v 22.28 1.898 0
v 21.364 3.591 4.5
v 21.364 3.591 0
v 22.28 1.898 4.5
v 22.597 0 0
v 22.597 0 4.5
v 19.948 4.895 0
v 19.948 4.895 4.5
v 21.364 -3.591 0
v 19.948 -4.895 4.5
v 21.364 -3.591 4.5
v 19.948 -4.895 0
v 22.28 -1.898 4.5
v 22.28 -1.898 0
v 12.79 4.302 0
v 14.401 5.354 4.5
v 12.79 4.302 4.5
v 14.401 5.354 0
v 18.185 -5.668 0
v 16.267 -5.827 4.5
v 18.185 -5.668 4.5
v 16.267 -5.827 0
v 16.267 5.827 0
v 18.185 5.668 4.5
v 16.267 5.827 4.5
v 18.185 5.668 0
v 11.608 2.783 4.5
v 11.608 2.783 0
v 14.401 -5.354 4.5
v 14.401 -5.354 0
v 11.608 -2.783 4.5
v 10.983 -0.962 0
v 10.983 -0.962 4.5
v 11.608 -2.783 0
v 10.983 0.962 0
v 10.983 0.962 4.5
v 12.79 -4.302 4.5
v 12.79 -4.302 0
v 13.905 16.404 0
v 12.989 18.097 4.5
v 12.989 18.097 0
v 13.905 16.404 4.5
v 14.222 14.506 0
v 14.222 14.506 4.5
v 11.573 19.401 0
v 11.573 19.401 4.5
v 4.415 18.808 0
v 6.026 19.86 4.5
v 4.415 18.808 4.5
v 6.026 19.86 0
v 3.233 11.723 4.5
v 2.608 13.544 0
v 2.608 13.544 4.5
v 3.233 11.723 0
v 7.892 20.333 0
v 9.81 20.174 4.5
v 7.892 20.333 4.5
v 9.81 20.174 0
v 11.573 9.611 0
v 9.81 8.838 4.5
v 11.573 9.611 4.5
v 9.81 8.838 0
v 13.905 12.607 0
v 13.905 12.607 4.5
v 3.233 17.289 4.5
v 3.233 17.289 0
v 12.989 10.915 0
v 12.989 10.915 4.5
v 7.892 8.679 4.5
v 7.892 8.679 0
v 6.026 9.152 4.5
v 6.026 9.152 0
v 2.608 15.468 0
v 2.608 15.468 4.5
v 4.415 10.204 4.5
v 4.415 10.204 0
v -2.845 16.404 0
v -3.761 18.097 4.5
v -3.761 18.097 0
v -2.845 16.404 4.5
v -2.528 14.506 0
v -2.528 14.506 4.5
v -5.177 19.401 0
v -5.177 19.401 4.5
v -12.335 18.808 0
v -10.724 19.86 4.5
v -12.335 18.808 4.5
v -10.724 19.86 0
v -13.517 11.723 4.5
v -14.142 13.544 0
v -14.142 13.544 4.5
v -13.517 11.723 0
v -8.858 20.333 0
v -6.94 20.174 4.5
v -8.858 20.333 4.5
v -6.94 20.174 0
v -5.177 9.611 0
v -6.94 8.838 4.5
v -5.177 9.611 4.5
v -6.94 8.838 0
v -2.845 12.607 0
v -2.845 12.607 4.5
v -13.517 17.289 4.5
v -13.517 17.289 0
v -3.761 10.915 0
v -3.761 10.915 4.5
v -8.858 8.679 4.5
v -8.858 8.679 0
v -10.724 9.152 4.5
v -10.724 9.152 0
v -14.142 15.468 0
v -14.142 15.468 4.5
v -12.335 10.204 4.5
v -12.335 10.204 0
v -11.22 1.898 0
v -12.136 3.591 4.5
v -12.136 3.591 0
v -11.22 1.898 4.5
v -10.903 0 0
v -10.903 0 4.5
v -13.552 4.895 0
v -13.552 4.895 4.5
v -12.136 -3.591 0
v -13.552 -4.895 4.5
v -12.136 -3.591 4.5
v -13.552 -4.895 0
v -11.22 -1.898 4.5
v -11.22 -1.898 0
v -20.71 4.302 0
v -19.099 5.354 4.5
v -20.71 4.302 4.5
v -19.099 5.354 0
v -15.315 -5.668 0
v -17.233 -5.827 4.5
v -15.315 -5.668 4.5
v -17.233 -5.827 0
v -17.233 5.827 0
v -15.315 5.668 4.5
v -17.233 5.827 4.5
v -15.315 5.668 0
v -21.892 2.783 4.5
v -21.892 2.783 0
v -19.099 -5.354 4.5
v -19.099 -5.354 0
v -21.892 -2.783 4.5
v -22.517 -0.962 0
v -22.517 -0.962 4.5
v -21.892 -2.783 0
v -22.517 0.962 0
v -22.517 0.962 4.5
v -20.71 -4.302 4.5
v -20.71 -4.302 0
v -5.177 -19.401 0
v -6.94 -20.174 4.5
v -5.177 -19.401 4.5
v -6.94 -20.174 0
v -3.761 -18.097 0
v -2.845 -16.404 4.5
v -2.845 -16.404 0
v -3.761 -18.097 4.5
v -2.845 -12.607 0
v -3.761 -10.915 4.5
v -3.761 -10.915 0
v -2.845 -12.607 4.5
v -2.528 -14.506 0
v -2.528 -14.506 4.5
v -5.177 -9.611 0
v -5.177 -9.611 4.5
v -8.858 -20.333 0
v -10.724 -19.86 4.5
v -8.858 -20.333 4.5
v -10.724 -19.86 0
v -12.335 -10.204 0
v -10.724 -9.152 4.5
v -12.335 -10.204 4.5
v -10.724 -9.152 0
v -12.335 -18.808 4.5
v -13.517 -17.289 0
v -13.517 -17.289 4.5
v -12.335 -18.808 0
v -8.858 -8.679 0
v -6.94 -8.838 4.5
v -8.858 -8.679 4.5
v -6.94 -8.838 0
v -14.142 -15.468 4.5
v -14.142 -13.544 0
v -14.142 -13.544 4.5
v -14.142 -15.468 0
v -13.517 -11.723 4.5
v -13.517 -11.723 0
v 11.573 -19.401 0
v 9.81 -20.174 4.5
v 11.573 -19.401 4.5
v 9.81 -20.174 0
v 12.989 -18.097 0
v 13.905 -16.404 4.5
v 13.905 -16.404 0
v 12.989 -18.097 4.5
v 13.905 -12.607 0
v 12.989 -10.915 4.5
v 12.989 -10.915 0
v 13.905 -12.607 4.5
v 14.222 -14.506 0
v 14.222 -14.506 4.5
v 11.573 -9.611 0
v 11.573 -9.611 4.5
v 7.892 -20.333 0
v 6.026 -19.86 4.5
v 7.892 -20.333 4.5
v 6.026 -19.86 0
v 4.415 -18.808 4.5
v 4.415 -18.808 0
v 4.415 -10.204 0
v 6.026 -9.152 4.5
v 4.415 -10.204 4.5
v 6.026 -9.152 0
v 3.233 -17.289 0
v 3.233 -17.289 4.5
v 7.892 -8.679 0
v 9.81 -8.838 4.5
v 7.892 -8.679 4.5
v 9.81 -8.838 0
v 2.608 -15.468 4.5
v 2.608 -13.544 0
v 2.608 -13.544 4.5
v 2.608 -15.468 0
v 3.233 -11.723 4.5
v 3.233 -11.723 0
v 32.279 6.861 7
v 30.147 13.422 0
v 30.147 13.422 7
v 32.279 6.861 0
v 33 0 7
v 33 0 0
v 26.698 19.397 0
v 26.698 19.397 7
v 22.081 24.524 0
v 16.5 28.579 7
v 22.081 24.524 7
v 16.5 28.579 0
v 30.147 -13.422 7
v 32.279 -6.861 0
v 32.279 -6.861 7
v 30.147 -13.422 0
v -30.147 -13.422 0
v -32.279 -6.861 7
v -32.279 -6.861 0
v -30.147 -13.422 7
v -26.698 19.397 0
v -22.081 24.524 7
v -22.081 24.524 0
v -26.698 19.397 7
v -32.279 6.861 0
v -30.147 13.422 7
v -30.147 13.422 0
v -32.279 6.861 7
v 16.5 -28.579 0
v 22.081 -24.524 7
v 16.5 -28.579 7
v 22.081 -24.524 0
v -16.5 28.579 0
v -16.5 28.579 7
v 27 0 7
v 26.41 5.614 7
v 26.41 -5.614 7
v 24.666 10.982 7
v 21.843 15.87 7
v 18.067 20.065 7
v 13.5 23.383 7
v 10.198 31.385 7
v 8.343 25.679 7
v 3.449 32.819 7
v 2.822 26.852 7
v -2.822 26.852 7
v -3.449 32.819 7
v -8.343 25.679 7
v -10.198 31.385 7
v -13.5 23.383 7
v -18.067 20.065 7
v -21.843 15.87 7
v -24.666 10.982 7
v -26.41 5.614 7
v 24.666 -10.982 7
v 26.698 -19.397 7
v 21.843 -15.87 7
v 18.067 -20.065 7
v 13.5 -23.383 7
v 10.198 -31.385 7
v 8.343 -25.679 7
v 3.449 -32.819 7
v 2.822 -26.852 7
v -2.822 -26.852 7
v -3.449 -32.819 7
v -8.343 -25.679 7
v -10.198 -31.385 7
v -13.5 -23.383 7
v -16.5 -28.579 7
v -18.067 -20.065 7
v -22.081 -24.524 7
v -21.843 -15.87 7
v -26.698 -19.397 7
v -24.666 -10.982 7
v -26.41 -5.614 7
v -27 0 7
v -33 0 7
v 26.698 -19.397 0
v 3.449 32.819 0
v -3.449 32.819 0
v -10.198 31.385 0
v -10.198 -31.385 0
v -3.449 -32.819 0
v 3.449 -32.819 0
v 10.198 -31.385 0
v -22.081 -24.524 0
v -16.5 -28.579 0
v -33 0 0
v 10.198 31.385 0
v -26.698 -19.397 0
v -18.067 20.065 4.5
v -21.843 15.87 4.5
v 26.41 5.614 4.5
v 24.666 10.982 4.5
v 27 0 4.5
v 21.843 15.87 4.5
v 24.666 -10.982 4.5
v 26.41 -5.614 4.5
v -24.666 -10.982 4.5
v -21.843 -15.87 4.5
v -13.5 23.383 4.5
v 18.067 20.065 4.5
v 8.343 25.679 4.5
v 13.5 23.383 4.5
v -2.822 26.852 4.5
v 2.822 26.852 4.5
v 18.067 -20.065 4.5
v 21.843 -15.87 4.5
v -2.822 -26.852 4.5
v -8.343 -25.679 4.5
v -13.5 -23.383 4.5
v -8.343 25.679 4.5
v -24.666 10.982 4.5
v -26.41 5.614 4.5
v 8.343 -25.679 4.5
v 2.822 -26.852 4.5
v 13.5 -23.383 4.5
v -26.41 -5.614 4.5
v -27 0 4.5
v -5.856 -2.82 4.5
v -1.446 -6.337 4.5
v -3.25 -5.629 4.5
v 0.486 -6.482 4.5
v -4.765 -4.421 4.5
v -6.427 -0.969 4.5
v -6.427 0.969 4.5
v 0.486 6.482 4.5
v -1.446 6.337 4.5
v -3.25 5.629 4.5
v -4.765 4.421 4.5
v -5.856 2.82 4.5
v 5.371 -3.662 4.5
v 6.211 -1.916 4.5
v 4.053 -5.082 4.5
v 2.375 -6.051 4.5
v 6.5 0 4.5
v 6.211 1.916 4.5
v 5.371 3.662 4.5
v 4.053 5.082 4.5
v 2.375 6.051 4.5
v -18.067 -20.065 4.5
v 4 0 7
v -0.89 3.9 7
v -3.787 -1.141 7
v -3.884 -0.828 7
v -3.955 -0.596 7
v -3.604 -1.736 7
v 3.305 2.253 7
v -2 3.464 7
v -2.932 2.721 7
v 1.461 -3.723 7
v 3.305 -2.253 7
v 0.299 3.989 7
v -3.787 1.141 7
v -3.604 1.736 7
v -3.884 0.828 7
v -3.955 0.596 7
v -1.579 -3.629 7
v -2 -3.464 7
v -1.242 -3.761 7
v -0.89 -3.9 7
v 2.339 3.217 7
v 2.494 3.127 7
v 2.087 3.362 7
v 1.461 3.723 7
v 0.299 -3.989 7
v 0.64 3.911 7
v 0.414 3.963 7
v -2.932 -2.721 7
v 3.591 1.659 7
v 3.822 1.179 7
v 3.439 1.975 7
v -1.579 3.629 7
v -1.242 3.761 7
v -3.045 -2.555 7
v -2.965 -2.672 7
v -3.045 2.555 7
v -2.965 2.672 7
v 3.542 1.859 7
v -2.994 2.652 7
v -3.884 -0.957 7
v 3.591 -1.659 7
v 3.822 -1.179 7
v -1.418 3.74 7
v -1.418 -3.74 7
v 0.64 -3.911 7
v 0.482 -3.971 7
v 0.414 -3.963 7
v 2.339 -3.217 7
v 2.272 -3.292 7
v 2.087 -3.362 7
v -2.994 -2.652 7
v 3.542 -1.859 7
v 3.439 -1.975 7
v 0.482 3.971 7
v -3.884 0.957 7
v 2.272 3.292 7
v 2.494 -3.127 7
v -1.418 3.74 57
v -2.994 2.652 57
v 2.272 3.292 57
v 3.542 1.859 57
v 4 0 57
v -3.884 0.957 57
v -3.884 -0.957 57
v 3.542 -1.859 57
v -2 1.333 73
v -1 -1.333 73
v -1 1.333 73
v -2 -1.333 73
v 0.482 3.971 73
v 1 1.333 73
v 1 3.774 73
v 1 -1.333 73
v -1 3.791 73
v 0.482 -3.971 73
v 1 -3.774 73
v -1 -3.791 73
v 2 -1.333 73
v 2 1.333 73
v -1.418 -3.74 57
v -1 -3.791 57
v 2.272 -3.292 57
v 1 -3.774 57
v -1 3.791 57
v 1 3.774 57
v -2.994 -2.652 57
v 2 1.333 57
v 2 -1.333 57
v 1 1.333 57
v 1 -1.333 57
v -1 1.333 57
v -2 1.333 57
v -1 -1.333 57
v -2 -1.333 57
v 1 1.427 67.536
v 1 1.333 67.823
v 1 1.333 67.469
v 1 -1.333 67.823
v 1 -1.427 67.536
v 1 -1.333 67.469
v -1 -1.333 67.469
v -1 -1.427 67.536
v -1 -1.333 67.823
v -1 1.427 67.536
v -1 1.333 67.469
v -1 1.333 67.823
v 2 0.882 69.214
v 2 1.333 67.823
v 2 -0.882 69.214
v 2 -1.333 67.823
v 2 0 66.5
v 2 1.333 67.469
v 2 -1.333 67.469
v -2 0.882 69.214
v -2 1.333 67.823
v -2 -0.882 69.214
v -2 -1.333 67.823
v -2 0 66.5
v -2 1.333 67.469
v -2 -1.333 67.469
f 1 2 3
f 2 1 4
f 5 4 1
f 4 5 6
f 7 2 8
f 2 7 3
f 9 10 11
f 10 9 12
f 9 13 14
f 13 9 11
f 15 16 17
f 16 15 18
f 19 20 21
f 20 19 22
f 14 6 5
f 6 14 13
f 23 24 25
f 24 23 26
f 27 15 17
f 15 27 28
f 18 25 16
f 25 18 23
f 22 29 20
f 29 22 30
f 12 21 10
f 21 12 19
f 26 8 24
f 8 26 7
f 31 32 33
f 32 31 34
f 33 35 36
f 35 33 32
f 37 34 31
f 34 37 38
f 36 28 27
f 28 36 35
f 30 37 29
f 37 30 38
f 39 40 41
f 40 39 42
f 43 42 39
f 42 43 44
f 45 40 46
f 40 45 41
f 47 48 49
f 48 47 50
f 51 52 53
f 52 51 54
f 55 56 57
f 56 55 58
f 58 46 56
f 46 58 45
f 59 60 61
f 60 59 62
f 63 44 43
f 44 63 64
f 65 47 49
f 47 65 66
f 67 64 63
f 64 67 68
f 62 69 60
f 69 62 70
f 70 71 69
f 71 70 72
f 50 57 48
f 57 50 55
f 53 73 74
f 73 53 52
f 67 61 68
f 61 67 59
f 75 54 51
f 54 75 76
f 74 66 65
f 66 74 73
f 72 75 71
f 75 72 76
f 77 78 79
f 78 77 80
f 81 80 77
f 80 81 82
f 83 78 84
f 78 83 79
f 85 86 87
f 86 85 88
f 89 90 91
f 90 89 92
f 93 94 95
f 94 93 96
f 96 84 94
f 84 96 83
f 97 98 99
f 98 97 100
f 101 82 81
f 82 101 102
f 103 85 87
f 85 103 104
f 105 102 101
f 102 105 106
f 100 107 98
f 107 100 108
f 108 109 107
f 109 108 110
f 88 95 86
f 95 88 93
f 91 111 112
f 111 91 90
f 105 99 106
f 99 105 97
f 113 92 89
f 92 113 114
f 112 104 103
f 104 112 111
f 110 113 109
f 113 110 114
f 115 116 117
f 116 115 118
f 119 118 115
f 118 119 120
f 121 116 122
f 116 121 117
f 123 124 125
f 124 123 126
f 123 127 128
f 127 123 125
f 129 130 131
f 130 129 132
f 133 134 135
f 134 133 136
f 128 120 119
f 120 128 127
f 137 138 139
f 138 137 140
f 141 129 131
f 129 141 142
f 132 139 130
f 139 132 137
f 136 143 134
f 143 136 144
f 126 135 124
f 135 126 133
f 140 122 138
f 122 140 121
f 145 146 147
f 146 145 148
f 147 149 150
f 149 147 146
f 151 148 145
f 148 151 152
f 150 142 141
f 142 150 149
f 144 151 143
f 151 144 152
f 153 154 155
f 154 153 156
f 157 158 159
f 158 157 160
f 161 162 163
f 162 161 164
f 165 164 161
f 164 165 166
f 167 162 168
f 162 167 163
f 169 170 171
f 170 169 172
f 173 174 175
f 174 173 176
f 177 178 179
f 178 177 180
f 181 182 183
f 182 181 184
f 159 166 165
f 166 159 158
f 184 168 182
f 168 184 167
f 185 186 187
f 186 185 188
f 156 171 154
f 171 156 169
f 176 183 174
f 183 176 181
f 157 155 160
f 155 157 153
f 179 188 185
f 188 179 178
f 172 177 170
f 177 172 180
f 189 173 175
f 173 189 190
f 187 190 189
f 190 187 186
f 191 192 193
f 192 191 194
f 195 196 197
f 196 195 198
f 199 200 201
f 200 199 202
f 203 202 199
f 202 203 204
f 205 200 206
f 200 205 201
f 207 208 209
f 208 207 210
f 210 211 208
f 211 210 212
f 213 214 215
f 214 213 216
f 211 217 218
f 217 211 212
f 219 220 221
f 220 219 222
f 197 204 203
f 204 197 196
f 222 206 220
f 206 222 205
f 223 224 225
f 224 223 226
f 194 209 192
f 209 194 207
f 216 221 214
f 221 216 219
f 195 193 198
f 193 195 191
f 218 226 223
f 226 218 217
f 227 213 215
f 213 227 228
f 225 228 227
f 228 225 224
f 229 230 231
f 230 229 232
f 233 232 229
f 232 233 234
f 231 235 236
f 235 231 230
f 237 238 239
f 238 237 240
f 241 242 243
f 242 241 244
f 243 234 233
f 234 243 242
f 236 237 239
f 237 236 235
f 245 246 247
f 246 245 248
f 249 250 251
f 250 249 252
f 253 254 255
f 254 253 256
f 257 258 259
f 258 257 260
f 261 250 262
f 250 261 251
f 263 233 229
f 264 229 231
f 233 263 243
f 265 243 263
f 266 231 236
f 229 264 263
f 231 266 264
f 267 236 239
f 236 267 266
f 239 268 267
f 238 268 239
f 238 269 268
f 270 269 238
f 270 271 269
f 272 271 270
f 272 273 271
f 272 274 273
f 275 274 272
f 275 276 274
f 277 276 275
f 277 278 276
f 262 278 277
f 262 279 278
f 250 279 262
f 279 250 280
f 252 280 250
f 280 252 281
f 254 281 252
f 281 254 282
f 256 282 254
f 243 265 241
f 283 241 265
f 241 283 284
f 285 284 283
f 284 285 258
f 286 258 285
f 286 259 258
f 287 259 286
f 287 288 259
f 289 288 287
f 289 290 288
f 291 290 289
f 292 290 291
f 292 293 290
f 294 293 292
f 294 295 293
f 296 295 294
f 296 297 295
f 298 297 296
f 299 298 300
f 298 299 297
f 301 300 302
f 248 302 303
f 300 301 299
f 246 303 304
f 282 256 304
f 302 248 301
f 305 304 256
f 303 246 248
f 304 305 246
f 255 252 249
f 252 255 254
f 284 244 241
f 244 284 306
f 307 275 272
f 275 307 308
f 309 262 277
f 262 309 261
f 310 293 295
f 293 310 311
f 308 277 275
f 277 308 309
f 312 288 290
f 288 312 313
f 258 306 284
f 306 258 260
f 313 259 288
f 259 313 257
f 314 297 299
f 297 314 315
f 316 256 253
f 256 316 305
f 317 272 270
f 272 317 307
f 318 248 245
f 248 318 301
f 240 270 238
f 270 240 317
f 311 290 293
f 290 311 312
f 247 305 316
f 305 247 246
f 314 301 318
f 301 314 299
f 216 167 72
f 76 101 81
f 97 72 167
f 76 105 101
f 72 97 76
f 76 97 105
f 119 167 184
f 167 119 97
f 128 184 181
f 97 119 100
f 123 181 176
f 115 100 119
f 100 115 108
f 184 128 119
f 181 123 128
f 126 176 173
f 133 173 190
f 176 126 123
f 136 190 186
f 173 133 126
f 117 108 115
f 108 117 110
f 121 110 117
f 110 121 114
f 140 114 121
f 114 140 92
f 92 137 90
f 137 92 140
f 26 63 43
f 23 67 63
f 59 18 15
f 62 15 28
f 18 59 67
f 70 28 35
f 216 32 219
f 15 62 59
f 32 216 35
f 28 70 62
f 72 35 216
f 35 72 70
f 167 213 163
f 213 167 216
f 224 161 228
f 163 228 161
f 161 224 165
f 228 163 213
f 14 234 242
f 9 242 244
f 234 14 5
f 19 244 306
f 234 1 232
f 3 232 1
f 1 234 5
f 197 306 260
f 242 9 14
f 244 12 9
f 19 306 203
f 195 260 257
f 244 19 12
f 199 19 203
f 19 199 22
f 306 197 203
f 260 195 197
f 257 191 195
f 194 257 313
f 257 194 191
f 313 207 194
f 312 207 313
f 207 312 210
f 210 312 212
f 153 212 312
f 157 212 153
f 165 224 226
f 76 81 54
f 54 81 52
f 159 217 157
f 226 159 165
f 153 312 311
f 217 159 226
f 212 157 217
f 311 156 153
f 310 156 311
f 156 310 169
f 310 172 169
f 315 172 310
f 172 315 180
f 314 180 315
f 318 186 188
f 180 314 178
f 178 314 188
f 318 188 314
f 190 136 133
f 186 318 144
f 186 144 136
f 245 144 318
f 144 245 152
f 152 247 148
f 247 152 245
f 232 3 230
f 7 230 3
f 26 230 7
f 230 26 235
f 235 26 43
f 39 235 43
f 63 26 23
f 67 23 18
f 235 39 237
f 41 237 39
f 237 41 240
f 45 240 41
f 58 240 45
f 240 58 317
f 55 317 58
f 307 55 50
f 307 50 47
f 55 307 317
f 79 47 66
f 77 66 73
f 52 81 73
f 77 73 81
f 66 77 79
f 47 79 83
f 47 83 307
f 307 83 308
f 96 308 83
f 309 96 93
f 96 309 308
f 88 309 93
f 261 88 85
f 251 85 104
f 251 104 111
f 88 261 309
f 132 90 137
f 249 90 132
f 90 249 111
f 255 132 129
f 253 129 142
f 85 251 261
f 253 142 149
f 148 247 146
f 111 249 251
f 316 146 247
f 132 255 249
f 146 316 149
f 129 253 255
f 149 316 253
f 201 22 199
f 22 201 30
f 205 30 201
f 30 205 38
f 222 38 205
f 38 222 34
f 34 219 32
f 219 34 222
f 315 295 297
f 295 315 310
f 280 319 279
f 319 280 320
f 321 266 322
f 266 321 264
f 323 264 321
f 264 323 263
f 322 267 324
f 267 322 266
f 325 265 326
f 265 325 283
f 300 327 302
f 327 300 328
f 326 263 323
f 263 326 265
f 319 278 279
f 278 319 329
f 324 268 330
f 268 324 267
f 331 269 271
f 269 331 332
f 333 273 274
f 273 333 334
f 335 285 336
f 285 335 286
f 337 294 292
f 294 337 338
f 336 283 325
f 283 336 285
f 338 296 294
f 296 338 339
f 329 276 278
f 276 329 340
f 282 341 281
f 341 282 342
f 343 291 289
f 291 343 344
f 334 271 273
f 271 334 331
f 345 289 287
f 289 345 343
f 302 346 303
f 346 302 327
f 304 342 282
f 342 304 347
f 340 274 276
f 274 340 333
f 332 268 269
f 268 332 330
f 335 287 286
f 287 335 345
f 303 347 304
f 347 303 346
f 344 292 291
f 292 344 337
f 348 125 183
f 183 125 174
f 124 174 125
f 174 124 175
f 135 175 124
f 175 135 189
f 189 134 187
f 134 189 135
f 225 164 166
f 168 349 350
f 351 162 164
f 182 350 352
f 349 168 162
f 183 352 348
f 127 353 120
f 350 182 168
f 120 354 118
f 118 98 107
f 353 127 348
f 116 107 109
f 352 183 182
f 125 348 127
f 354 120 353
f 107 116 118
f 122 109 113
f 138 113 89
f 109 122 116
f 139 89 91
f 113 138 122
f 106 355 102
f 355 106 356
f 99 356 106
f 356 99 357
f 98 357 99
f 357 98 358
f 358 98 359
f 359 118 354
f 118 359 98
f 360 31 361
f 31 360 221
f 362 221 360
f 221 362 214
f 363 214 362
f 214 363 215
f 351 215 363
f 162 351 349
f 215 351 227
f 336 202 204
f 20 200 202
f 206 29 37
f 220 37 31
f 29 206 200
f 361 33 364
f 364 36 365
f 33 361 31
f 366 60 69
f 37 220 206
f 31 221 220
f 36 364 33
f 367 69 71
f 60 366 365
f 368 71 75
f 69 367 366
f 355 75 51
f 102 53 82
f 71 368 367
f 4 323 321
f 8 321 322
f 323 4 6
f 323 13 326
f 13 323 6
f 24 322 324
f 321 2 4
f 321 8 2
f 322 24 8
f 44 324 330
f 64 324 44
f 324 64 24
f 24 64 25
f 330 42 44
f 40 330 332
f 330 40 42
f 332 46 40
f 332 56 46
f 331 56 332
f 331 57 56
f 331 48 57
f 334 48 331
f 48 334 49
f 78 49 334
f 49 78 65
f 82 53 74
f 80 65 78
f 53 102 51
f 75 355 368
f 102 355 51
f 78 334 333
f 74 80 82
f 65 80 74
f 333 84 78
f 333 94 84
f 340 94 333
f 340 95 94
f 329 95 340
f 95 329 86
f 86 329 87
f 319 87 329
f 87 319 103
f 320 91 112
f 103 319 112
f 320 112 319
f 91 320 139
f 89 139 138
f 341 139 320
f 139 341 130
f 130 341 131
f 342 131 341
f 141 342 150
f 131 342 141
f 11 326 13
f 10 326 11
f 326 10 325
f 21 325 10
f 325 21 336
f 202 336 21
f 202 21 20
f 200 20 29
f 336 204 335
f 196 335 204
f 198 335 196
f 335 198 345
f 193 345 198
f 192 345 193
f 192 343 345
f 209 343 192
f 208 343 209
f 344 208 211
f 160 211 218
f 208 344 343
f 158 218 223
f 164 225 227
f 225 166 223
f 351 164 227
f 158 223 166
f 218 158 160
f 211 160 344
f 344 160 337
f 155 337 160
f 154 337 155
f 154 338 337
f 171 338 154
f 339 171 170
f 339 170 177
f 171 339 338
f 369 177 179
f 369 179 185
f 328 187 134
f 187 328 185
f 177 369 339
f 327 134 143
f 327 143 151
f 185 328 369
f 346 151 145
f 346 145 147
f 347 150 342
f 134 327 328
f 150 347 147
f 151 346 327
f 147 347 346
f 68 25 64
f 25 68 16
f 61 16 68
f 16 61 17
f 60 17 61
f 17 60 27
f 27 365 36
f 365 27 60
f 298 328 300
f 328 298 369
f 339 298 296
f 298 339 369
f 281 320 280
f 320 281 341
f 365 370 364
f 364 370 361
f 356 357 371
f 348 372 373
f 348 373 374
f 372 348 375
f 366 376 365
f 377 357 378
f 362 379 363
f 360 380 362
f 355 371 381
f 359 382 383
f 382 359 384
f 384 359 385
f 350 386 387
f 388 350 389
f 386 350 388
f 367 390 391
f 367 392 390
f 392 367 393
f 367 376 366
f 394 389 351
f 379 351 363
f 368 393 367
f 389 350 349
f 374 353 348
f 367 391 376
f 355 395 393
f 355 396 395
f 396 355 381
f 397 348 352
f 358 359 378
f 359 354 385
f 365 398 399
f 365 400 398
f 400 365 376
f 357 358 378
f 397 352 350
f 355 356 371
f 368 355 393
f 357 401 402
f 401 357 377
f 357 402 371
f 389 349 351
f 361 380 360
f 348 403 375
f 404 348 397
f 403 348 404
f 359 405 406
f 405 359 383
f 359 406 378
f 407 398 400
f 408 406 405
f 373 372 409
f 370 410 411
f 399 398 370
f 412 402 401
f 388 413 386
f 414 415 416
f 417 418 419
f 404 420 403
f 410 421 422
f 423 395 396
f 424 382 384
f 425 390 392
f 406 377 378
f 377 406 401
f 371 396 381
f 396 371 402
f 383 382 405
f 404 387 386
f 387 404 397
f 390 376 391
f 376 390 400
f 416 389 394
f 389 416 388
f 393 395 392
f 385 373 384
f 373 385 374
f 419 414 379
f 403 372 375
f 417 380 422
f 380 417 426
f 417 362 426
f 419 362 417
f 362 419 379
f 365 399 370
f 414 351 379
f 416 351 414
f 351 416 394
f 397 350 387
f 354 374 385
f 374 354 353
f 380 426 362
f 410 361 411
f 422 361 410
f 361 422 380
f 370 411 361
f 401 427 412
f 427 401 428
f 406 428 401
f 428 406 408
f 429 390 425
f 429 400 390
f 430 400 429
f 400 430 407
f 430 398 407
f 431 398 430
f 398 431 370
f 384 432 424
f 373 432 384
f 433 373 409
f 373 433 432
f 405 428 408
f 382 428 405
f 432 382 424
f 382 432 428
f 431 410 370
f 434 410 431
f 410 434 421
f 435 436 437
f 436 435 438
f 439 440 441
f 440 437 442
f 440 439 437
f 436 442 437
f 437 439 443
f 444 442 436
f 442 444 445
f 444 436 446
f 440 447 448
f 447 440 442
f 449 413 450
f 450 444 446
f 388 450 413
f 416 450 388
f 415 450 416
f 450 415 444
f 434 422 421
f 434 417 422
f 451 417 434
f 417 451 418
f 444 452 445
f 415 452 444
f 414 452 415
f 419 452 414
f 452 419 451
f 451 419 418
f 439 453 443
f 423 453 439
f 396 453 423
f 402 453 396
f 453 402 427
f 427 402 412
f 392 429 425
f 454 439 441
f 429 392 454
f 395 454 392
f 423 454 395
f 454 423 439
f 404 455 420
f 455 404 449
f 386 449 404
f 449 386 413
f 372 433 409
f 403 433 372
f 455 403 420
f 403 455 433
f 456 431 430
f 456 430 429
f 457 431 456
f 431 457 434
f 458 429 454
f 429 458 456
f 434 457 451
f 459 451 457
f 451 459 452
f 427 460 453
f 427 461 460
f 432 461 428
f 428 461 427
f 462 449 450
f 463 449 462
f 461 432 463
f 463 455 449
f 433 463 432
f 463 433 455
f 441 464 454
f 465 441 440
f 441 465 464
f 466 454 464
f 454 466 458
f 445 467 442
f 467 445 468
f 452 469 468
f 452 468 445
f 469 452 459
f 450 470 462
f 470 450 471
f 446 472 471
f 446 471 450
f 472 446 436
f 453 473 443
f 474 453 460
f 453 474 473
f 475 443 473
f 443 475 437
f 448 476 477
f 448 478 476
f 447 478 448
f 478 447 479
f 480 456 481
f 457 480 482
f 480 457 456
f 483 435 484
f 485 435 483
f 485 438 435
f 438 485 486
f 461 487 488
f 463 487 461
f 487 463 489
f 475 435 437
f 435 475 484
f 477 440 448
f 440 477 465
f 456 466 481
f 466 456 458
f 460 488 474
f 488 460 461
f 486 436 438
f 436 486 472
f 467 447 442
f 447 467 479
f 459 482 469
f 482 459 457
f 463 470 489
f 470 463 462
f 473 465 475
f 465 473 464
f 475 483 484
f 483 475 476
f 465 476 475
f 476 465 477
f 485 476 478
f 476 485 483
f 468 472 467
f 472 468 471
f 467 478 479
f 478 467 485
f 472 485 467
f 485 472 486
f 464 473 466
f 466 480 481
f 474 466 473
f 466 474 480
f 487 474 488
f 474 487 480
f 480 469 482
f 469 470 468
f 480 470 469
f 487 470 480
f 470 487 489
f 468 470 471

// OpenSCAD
// file: wheel_axle.scad
/* sinusoid-plotter: A parametric sinusoid plotter made with OpenSCAD.
 * Copyright (C) 2013  Clayton G. Hobbs
 * 
 * This program is free software: you can redistribute it and/or modify
 * it under the terms of the GNU General Public License as published by
 * the Free Software Foundation, either version 3 of the License, or
 * (at your option) any later version.
 * 
 * This program is distributed in the hope that it will be useful,
 * but WITHOUT ANY WARRANTY; without even the implied warranty of
 * MERCHANTABILITY or FITNESS FOR A PARTICULAR PURPOSE.  See the
 * GNU General Public License for more details.
 * 
 * You should have received a copy of the GNU General Public License
 * along with this program.  If not, see <http://www.gnu.org/licenses/>.
 */

include <constants.scad>;

module wheel_axle(radius, height, rim_thickness, rim_height, axle_radius,
                   axle_length, holes=6, hole_radius_factor=4/3) {
	middle_radius = (radius - rim_thickness + axle_radius + rim_height)/2;
	hole_radius = hole_radius_factor*pi*middle_radius/(holes*2);

	difference() {
		// Wheel body
		cylinder(r = radius, h = height);

		// Cutout on axle side to save plastic
		translate([0, 0, height - rim_height])
		cylinder(r = radius - rim_thickness, h = height);

		// Holes through the wheel to save plastic
		for(x = [0:holes-1]) {
			translate([cos(360*x/holes)*middle_radius,
                       sin(360*x/holes)*middle_radius, -.5])
			cylinder(r = hole_radius, h = height + 1);
		}
	}

	// Axle flange
	translate([0, 0, height - rim_height])
	cylinder(r1 = axle_radius + rim_height, r2 = axle_radius,
             h = rim_height);

	// Axle shaft
	translate([0, 0, height])
	cylinder(r = axle_radius, h = axle_length);
}

wheel_axle(radius = 33, height = 7, rim_thickness = 6, rim_height = 2.5,
            axle_radius = 4, axle_length = 55);

// vim: ts=4 sw=4 noet
// file: constants.scad
/* sinusoid-plotter: A parametric sinusoid plotter made with OpenSCAD.
 * Copyright (C) 2013  Clayton G. Hobbs
 * 
 * This program is free software: you can redistribute it and/or modify
 * it under the terms of the GNU General Public License as published by
 * the Free Software Foundation, either version 3 of the License, or
 * (at your option) any later version.
 * 
 * This program is distributed in the hope that it will be useful,
 * but WITHOUT ANY WARRANTY; without even the implied warranty of
 * MERCHANTABILITY or FITNESS FOR A PARTICULAR PURPOSE.  See the
 * GNU General Public License for more details.
 * 
 * You should have received a copy of the GNU General Public License
 * along with this program.  If not, see <http://www.gnu.org/licenses/>.
 */

pi = 3.1415926535897932384626433832795;
// main file
/* sinusoid-plotter: A parametric sinusoid plotter made with OpenSCAD.
 * Copyright (C) 2013  Clayton G. Hobbs
 * 
 * This program is free software: you can redistribute it and/or modify
 * it under the terms of the GNU General Public License as published by
 * the Free Software Foundation, either version 3 of the License, or
 * (at your option) any later version.
 * 
 * This program is distributed in the hope that it will be useful,
 * but WITHOUT ANY WARRANTY; without even the implied warranty of
 * MERCHANTABILITY or FITNESS FOR A PARTICULAR PURPOSE.  See the
 * GNU General Public License for more details.
 * 
 * You should have received a copy of the GNU General Public License
 * along with this program.  If not, see <http://www.gnu.org/licenses/>.
 */

include <constants.scad>;
use <wheel_axle.scad>;

module male_wheel(radius, height, rim_thickness, rim_height, axle_radius,
                  axle_length, coupler_length, gear_thickness, holes=6,
                  hole_radius_factor=4/3) {
	difference() {
		union() {
			difference() {
				// Wheel with specified parameters and an extra-long axle (the
				// extra part is cut apart to make the attachment to the female
				// wheel)
				wheel_axle(radius=radius, height=height,
                           rim_thickness=rim_thickness,
                           rim_height=rim_height, axle_radius=axle_radius,
                           axle_length=axle_length+gear_thickness+coupler_length,
                           holes=holes, hole_radius_factor=hole_radius_factor);

				// Cut out the sides of the coupler
				translate([axle_radius/4, -axle_radius, height + axle_length])
				cube([axle_radius, axle_radius*2,
                      coupler_length + gear_thickness + 1]);
				translate([-5*axle_radius/4, -axle_radius,
                           height + axle_length])
				cube([axle_radius, axle_radius*2,
                      coupler_length + gear_thickness + 1]);
			}
			// Add the center prism to the coupler
			translate([-axle_radius/2, -axle_radius/3, height + axle_length])
			cube([axle_radius, 2*axle_radius/3,
                  coupler_length + gear_thickness]);
		}

		// Cut out a screw hole from the coupler
		translate([0, 0,
                   height + axle_length + gear_thickness + coupler_length/2])
		rotate([0, 90, 0])
		cylinder(r = 1.5, h = axle_radius*2, center = true);
	}
}

male_wheel(radius = 33, height = 7, rim_thickness = 6, rim_height = 2.5,
           axle_radius = 4, axle_length = 50, coupler_length = 10,
           gear_thickness = 6);

// vim: ts=4 sw=4 noet
